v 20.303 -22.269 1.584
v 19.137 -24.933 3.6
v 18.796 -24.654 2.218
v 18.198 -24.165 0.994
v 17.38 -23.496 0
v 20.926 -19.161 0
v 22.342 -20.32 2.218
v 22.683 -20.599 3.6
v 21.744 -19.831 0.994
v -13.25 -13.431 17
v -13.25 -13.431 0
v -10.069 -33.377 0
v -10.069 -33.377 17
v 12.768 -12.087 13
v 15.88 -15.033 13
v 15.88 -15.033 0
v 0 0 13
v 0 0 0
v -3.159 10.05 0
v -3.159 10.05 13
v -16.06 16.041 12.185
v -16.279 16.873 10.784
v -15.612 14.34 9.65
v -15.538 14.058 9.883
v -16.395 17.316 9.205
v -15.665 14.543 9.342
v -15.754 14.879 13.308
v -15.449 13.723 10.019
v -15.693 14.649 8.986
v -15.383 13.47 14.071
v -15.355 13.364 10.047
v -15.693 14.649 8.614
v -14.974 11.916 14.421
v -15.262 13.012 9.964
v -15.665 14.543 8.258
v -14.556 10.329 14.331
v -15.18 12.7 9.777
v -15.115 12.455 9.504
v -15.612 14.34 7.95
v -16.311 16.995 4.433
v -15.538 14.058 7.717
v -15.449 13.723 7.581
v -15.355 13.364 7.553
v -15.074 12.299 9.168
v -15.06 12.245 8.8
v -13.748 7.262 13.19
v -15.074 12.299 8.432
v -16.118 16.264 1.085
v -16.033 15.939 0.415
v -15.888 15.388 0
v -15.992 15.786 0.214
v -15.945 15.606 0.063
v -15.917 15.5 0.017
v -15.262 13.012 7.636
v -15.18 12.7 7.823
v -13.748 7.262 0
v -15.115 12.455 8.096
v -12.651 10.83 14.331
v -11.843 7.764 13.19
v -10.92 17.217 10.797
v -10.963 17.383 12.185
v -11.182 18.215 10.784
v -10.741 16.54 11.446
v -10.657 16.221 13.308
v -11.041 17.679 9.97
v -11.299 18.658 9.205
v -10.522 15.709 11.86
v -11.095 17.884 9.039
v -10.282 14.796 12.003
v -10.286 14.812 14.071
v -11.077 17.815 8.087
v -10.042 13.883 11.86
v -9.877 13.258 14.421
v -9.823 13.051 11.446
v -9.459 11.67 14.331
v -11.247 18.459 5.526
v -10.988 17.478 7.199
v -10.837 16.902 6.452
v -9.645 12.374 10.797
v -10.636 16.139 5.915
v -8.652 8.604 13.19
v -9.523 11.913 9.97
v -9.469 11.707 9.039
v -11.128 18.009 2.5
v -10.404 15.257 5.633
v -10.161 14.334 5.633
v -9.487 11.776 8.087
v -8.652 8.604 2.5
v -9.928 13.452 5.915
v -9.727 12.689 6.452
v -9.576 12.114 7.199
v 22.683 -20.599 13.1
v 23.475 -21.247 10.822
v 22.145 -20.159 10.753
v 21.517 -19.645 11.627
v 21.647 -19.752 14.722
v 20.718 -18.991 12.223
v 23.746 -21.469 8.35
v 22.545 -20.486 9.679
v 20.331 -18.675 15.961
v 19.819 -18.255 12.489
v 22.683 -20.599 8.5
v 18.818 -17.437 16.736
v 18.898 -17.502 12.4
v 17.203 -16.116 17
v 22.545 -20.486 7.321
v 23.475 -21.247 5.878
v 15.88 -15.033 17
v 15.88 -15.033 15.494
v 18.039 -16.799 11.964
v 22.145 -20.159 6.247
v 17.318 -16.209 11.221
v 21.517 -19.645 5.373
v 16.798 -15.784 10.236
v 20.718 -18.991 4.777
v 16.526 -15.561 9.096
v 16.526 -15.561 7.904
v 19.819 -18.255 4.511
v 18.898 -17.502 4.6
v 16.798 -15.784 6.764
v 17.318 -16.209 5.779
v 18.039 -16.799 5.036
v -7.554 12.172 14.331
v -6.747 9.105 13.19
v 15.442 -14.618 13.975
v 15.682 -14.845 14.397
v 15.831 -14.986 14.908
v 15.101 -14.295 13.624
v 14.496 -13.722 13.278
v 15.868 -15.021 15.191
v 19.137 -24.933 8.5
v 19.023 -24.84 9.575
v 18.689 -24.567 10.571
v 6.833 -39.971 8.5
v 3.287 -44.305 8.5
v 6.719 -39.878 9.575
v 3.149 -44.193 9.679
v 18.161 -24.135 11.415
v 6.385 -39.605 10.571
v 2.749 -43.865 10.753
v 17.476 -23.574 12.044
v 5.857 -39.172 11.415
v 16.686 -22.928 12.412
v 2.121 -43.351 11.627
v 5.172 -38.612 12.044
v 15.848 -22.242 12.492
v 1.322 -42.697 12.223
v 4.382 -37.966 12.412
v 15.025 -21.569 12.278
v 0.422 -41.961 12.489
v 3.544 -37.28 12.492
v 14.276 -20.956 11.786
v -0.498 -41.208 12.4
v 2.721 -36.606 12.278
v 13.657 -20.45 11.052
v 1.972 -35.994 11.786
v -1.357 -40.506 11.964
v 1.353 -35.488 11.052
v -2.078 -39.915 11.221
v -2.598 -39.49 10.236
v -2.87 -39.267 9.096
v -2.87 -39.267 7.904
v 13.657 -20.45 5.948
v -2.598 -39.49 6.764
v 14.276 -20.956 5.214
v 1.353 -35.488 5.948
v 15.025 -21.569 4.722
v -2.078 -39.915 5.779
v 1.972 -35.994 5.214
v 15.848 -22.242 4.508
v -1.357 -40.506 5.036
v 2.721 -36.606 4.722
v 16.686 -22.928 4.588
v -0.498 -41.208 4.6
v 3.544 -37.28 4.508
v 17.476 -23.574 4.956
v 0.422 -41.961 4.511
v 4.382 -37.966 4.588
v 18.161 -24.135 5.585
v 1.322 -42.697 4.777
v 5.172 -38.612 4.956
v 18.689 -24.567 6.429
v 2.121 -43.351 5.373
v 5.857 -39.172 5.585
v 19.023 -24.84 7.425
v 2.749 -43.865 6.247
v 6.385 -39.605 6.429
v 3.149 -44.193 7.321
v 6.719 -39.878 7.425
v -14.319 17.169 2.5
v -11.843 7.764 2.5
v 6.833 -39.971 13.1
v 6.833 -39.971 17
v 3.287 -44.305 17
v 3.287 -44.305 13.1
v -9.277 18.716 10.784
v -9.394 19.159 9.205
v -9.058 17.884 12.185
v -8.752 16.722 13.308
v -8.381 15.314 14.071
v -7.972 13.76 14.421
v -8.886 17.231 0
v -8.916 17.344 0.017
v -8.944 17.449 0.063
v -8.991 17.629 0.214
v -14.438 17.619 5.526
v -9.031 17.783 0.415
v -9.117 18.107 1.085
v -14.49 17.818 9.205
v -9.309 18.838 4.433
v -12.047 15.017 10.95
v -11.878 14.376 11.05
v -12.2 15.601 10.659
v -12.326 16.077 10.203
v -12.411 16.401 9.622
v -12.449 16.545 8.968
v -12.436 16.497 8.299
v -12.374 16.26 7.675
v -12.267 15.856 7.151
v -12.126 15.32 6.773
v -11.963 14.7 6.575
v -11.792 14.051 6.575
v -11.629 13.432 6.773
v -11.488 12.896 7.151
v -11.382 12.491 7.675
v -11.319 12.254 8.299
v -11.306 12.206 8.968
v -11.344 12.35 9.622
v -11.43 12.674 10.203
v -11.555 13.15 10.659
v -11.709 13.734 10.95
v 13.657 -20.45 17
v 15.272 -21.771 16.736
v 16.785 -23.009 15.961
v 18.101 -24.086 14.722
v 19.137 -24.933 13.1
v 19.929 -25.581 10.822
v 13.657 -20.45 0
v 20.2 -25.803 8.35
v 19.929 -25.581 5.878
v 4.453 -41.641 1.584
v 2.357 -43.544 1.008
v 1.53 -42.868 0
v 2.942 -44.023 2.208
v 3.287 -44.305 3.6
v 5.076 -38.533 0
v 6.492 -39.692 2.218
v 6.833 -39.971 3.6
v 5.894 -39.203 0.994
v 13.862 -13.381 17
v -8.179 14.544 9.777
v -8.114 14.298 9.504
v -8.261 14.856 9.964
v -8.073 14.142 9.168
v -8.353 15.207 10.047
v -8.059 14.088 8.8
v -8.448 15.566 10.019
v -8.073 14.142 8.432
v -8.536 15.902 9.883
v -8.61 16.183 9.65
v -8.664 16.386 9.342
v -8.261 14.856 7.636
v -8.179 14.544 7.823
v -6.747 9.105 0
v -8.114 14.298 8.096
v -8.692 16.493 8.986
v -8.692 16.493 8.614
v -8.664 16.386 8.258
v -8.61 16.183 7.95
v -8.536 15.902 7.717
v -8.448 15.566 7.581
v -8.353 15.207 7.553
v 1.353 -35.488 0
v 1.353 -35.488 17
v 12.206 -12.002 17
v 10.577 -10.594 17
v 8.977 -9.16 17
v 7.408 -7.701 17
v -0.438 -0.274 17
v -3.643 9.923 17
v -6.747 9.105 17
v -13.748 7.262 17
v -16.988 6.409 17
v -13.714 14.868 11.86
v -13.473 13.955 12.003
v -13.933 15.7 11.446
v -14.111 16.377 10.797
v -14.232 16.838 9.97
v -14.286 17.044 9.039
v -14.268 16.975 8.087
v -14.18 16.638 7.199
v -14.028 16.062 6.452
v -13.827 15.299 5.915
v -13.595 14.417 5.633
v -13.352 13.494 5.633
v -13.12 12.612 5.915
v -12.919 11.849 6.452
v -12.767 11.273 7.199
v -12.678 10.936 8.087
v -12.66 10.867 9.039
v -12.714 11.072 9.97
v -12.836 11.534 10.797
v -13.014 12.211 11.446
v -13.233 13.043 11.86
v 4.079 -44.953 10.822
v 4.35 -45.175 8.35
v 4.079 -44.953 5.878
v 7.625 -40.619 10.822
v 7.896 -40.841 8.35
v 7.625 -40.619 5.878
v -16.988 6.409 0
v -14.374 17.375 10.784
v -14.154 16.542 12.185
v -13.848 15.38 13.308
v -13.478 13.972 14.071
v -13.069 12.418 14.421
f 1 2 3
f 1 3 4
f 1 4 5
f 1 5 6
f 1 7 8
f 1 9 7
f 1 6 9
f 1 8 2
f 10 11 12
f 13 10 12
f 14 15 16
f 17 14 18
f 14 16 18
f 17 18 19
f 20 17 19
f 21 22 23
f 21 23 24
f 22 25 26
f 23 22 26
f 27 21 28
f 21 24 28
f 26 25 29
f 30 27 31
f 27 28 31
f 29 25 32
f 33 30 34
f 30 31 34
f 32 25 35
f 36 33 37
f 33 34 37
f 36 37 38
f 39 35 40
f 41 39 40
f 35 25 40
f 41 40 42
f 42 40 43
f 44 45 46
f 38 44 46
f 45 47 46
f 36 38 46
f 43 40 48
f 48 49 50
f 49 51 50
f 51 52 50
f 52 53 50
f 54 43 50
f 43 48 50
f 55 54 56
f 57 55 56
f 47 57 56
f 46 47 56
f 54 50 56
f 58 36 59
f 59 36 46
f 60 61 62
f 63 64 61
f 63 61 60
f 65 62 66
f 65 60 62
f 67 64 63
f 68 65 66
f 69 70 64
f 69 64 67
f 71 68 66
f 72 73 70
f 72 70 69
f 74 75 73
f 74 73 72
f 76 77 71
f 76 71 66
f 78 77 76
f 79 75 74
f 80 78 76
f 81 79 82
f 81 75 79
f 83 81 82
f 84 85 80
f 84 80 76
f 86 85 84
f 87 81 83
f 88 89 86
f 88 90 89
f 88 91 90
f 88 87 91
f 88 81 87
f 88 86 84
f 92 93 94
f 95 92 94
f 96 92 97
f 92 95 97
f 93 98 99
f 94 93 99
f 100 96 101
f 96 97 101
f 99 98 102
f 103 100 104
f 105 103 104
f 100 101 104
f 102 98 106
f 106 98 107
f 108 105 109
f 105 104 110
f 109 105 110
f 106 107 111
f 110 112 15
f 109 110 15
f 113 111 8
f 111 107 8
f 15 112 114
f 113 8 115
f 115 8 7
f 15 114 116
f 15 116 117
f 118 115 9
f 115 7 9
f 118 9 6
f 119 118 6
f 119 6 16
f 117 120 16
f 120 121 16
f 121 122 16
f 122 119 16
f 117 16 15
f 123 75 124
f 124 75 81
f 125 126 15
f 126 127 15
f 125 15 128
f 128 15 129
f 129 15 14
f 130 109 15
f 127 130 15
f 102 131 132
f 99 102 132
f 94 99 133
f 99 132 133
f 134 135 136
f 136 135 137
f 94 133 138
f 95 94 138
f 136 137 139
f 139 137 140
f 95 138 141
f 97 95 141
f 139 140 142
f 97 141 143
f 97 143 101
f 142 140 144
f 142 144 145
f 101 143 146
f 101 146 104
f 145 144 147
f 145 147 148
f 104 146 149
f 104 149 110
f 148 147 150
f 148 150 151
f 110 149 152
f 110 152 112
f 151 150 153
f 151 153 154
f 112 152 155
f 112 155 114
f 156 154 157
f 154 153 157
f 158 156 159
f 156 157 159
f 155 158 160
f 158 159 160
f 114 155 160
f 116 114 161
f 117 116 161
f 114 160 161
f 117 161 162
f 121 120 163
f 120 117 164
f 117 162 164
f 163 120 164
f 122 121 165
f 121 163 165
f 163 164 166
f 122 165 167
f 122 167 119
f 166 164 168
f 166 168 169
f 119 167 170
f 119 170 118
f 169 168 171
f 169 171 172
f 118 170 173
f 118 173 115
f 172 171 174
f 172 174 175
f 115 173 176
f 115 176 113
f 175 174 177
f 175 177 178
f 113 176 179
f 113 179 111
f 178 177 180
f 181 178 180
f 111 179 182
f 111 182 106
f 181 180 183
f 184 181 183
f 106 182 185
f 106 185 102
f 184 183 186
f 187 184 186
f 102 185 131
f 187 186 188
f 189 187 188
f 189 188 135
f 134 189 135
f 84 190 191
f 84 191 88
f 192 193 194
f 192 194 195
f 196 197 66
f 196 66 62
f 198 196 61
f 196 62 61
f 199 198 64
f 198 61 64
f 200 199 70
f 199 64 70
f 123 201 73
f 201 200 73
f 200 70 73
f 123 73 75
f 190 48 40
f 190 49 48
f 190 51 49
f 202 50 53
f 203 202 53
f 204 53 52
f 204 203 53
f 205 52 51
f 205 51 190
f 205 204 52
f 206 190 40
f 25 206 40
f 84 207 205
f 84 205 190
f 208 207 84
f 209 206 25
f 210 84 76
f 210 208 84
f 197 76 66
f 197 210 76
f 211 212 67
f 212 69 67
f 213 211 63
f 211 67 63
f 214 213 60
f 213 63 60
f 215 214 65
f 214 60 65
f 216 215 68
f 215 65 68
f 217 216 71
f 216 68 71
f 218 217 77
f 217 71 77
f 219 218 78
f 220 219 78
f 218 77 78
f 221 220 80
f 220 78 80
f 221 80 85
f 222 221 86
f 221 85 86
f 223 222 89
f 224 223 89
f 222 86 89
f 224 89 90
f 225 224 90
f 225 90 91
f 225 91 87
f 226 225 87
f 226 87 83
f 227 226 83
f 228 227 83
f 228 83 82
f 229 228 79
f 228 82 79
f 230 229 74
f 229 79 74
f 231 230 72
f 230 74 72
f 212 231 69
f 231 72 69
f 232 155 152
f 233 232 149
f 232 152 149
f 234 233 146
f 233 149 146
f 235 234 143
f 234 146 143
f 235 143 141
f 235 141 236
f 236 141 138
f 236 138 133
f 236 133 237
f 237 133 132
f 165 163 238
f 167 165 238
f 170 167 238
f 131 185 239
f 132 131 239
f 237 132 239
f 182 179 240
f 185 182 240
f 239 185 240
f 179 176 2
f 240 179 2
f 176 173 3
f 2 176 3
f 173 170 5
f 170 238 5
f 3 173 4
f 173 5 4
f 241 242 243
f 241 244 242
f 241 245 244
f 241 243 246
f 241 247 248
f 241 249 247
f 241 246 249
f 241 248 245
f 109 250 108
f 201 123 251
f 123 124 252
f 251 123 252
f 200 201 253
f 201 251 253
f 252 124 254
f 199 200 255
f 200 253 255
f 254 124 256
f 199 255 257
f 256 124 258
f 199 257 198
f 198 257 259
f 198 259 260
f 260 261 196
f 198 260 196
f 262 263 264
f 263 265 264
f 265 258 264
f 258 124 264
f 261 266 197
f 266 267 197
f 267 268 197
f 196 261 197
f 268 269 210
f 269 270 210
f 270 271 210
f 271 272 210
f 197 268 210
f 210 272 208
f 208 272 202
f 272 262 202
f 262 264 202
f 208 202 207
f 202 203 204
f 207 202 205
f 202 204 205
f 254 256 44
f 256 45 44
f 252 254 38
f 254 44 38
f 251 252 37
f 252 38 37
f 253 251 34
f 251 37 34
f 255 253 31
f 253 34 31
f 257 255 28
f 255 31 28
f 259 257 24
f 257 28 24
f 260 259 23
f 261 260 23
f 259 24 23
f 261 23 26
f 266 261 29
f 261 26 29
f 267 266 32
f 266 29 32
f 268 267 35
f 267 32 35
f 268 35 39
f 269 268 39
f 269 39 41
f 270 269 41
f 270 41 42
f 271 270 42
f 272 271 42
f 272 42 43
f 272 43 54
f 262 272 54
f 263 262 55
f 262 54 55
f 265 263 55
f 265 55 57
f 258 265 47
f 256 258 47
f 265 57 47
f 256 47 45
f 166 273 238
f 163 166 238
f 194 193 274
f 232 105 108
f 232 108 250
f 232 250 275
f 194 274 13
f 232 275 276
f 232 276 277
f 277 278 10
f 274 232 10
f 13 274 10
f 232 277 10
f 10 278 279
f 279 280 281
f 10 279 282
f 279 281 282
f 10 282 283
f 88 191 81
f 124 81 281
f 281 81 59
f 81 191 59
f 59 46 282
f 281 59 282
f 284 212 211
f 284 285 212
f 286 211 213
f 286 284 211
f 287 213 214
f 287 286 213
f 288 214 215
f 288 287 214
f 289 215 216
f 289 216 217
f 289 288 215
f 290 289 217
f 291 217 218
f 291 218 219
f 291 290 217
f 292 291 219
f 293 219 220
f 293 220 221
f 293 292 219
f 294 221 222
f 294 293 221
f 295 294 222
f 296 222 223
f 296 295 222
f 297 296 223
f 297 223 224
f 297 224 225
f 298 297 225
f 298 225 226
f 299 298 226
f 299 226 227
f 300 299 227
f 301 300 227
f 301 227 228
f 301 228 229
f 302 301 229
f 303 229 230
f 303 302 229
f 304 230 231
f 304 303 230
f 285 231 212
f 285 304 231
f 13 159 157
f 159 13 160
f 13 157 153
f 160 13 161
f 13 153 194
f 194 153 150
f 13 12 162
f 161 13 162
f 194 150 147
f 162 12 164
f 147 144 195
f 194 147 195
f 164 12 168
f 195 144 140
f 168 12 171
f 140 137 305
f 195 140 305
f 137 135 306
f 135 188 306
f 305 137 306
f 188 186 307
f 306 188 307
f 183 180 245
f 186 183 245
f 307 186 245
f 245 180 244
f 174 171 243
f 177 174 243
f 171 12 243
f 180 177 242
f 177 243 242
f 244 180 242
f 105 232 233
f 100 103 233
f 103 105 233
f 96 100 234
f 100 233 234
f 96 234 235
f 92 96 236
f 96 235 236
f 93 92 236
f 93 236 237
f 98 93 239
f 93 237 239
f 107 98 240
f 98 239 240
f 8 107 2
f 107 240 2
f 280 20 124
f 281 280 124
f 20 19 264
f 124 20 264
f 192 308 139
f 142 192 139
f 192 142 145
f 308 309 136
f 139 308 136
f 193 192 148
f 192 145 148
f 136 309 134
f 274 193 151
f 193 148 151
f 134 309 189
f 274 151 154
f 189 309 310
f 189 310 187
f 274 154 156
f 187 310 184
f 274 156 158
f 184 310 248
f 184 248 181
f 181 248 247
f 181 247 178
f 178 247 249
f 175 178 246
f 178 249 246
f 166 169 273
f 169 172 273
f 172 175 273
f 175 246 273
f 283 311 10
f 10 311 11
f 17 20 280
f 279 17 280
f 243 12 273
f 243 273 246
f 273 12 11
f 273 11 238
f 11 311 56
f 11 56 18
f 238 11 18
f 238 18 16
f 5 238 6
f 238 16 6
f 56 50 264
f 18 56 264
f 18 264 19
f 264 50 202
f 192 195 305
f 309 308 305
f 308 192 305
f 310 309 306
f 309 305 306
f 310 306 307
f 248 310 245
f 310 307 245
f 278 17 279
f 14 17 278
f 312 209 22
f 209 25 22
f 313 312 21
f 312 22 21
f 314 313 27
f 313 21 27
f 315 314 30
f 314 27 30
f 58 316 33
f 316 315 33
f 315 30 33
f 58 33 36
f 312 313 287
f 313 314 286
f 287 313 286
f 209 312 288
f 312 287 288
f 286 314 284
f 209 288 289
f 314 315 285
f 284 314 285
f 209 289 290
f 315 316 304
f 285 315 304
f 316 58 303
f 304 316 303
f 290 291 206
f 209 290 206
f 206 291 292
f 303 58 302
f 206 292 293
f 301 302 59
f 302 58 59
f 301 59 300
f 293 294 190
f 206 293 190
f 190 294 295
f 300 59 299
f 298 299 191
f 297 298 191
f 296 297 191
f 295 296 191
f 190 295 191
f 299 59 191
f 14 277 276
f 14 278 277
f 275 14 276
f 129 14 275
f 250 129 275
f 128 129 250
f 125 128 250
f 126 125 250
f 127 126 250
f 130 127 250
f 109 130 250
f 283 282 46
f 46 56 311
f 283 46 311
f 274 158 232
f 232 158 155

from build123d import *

# Parameters (mm, degrees)
BOSS_EXTRUDE1_DEPTH           = 17
CUT_EXTRUDE1_DEPTH            = 17
SKETCH3_R                     = 1.25
CUT_EXTRUDE2_DEPTH            = 17
CUT_EXTRUDE3_START            = -10.402815
SKETCH4_W                     = 3.3
SKETCH4_H                     = 12.499682623
CUT_EXTRUDE3_DEPTH            = 10.402815
SKETCH5_R                     = 2.25
SKETCH5_R_2                   = 1.25
EXTRUDE_THIN1_DEPTH           = 1.65
EXTRUDE_THIN1_TAPER           = -30
EXTRUDE_THIN1_OTHER_WAY_DEPTH = 1.65
EXTRUDE_THIN1_OTHER_WAY_TAPER = -30
SKETCH6_R                     = 1.25
CUT_EXTRUDE4_DEPTH            = 58.713758796
CUT_EXTRUDE5_DEPTH            = 47
CUT_EXTRUDE6_DEPTH            = 51
SKETCH9_R                     = 4
CUT_EXTRUDE7_DEPTH            = 51
CHAMFER2_SIZE                 = 4
CHAMFER2_SIZE_2               = 0.5
FILLET3_R                     = 30
FILLET4_SIZE                  = 2
FILLET4_SIZE_2                = 10


with BuildPart() as part:
    # Sketch1 → Boss-Extrude1 (new body)
    with BuildSketch(Plane.XY):
        Polygon((0, 0), (-3.159113316, 10.05), (-6.746853749, 9.105426772), (-9.395430715, 19.165426772), (-16.396843313, 17.322108667), (-13.748266347, 7.262108667), (-16.987870242, 6.409192141), (-13.249821349, -13.430807859), (-10.069194805, -33.377281726), (4.664340434, -45.432247006), (8.210516928, -41.098122841), (1.353313338, -35.487565032), (13.657279278, -20.449702081), (20.514482868, -26.06025989), (24.060659362, -21.726135725), (15.88, -15.032727593), align=None)
    extrude(amount=BOSS_EXTRUDE1_DEPTH)

    # Sketch2 → Cut-Extrude1 (cut)
    with BuildSketch(Plane(origin=(-11.069057434, -2.914239618, 0), x_dir=(0, 0, 1), z_dir=(-0.9670459389139427, -0.2546019482055291, 0))):
        with BuildLine():
            Line((14.33099337, 13.694095472), (13.19, 10.523128091))
            Line((13.19, 10.523128091), (20.415721384, 10.523128091))
            Line((20.415721384, 10.523128091), (20.415721384, 21.928823046))
            Line((20.415721384, 21.928823046), (-2.093019815, 21.928823046))
            Line((-2.093019815, 21.928823046), (-2.093019815, 20.981086575))
            Line((-2.093019815, 20.981086575), (9.161350785, 20.925943092))
            ThreePointArc((9.161350785, 20.925943092), (13.295140538, 18.417290029), (14.33099337, 13.694095472))
        make_face()
    extrude(amount=-CUT_EXTRUDE1_DEPTH, mode=Mode.SUBTRACT)

    # Sketch3 → Cut-Extrude2 (cut)
    with BuildSketch(Plane(origin=(-11.069057434, -2.914239618, 0), x_dir=(0, 0, 1), z_dir=(-0.9670459389139427, -0.2546019482055291, 0))):
        with Locations(Location((8.8, 16.925943092, 0), (0, 0, 270))):
            Circle(SKETCH3_R)
    extrude(amount=-CUT_EXTRUDE2_DEPTH, mode=Mode.SUBTRACT)

    # Sketch4 → Cut-Extrude3 (cut)
    with BuildSketch(Plane(origin=(-5.327785879, 20.236348285, 0), x_dir=(0.9670459389139427, 0.2546019482055291, 0), z_dir=(-0.2546019482055291, 0.9670459389139427, 0)).offset(CUT_EXTRUDE3_START)):
        with Locations((-7.826258123, -8.749841312)):
            Rectangle(SKETCH4_W, SKETCH4_H)
    extrude(amount=CUT_EXTRUDE3_DEPTH, mode=Mode.SUBTRACT)

    # Sketch5 → Extrude-Thin1 (add)
    with BuildSketch(Plane(origin=(-7.568351135, -1.992580565, 0), x_dir=(0, 0, 1), z_dir=(-0.9670459389139427, -0.25460194820552917, 0))):
        with Locations((8.8, 16.925943092)):
            Circle(SKETCH5_R)
        with Locations((8.8, 16.925943092)):
            Circle(SKETCH5_R_2, mode=Mode.SUBTRACT)
    extrude(amount=EXTRUDE_THIN1_DEPTH, taper=EXTRUDE_THIN1_TAPER)

    # Sketch5 → Extrude-Thin1 other way (add)
    with BuildSketch(Plane(origin=(-7.568351135, -1.992580565, 0), x_dir=(0, 0, 1), z_dir=(-0.9670459389139427, -0.25460194820552917, 0))):
        with Locations((8.8, 16.925943092)):
            Circle(SKETCH5_R)
        with Locations((8.8, 16.925943092)):
            Circle(SKETCH5_R_2, mode=Mode.SUBTRACT)
    extrude(amount=-EXTRUDE_THIN1_OTHER_WAY_DEPTH, taper=EXTRUDE_THIN1_OTHER_WAY_TAPER)

    # Sketch6 → Cut-Extrude4 (cut, through all)
    with BuildSketch(Plane(origin=(-11.069057434, -2.914239618, 0), x_dir=(0, 0, 1), z_dir=(-0.9670459389139427, -0.2546019482055291, 0))):
        with Locations(Location((8.8, 16.925943092, 0), (0, 0, 270))):
            Circle(SKETCH6_R)
    extrude(amount=-CUT_EXTRUDE4_DEPTH, mode=Mode.SUBTRACT)

    # Sketch7 → Cut-Extrude5 (cut)
    with BuildSketch(Plane(origin=(-20.395990741, -24.927906579, 0), x_dir=(-0.773950743756153, 0.633245802385849, 0), z_dir=(-0.6332458023858489, -0.7739507437561529, 0))):
        with BuildLine():
            add(Edge.make_bspline(
                [(-28.329749458, 0), (-30.166192179, -1.367621789), (-30.599748983, -3.6)],
                knots=[0, 0, 0, 1, 1, 1], degree=2))
            Line((-28.329749458, 0), (-32.379749458, 0))
            Line((-32.379749458, 0), (-32.379749458, -17))
            Line((-32.379749458, -17), (-30.599749458, -17))
            Line((-30.599749458, -17), (-30.599749458, -13.1))
            ThreePointArc((-30.599749458, -13.1), (-31.973295872, -8.349999931), (-30.599748983, -3.6))
        make_face()
    extrude(amount=-CUT_EXTRUDE5_DEPTH, mode=Mode.SUBTRACT)

    # Sketch8 → Cut-Extrude6 (cut)
    with BuildSketch(Plane(origin=(-4.545848307, -5.555919463, 0), x_dir=(0.7739507437561534, -0.6332458023858486, 0), z_dir=(-0.6332458023858486, -0.7739507437561534, 0))):
        with BuildLine():
            Line((30.599749458, 13.1), (30.599749458, 17))
            Line((30.599749458, 17), (23.519749458, 17))
            ThreePointArc((23.519749458, 17), (27.561296191, 15.960500224), (30.599749458, 13.1))
        make_face()
    extrude(amount=-CUT_EXTRUDE6_DEPTH, mode=Mode.SUBTRACT)

    # Sketch9 → Cut-Extrude7 (cut)
    with BuildSketch(Plane(origin=(-20.395990741, -24.927906579, 0), x_dir=(-0.773950743756153, 0.633245802385849, 0), z_dir=(-0.6332458023858489, -0.7739507437561529, 0))):
        with Locations(Location((-26.599749458, -8.5, 0), (0, 0, 180))):
            Circle(SKETCH9_R)
    extrude(amount=-CUT_EXTRUDE7_DEPTH, mode=Mode.SUBTRACT)

    # Chamfer2
    # the kernel refuses this chamfer: 4, 0.5 mm, written as the material it takes off along each edge
    with BuildSketch(Plane(origin=(23.430476857, -22.180351132, 17), x_dir=(0.003280548241470475, 0.003465446024389789, -0.9999886142787264), z_dir=(-0.7262148132107521, 0.6874678502106645, 0))) as chamfer2_piece_1_section:
        Polygon((CHAMFER2_SIZE * 0.999988614279, CHAMFER2_SIZE * 0.00477192968437), (-CHAMFER2_SIZE_2 * 0.00477192968437, CHAMFER2_SIZE_2 * 0.999988614279), (0, 0), align=None)
    chamfer2_piece_1 = extrude(amount=42.660867212, mode=Mode.PRIVATE)
    chamfer2_piece_1 = split(chamfer2_piece_1, bisect_by=Plane(origin=(2.714923218, -8.636910301, 15.455863369), z_dir=(0.9539790028805075, 0.2998734100635013, 0)), keep=Keep.TOP, mode=Mode.PRIVATE)
    chamfer2_piece_1 = split(chamfer2_piece_1, bisect_by=Plane(origin=(6.949444097, -7.725754787, 15.455863369), z_dir=(0.6332458023858455, 0.7739507437561558, 0)), keep=Keep.TOP, mode=Mode.PRIVATE)
    add(chamfer2_piece_1, mode=Mode.SUBTRACT)
    with BuildSketch(Plane(origin=(3.117792699, -9.918547862, 17), x_dir=(0.0045523207221114005, 0.0014309748270353465, -0.9999886142787264), z_dir=(-0.2998734100635013, 0.9539790028805075, 0))) as chamfer2_piece_2_section:
        Polygon((CHAMFER2_SIZE * 0.999988614279, CHAMFER2_SIZE * 0.00477192968437), (-CHAMFER2_SIZE_2 * 0.00477192968437, CHAMFER2_SIZE_2 * 0.999988614279), (0, 0), align=None)
    chamfer2_piece_2 = extrude(amount=31.328882119, mode=Mode.PRIVATE)
    chamfer2_piece_2 = split(chamfer2_piece_2, bisect_by=Plane(origin=(-6.749370263, 6.389259735, 15.513791759), z_dir=(0.6874678502106645, 0.7262148132107521, 0)), keep=Keep.TOP, mode=Mode.PRIVATE)
    add(chamfer2_piece_2, mode=Mode.SUBTRACT)
    with BuildSketch(Plane(origin=(3.117792699, -9.918547862, 17), x_dir=(0.0045523207221114005, 0.0014309748270353465, -0.9999886142787264), z_dir=(-0.2998734100635013, 0.9539790028805075, 0))) as chamfer2_piece_3a_section:
        Polygon((CHAMFER2_SIZE * 0.999988614279, CHAMFER2_SIZE * 0.00477192968437), (-CHAMFER2_SIZE_2 * 0.00477192968437, CHAMFER2_SIZE_2 * 0.999988614279), (0, 0), align=None)
    chamfer2_piece_3a = extrude(amount=31.328882119, mode=Mode.PRIVATE)
    chamfer2_piece_3a = split(chamfer2_piece_3a, bisect_by=Plane(origin=(3.183687603, -3.013822952, 15.535130807), z_dir=(-0.6874678502106645, -0.7262148132107521, 0)), keep=Keep.TOP, mode=Mode.PRIVATE)
    with BuildSketch(Plane(origin=(23.430476857, -22.180351132, 17), x_dir=(0.003280548241470475, 0.003465446024389789, -0.9999886142787264), z_dir=(-0.7262148132107521, 0.6874678502106645, 0))) as chamfer2_piece_3b_section:
        Polygon((CHAMFER2_SIZE * 0.999988614279, CHAMFER2_SIZE * 0.00477192968437), (-CHAMFER2_SIZE_2 * 0.00477192968437, CHAMFER2_SIZE_2 * 0.999988614279), (0, 0), align=None)
    chamfer2_piece_3b = extrude(amount=42.660867212, mode=Mode.PRIVATE)
    chamfer2_piece_3b = split(chamfer2_piece_3b, bisect_by=Plane(origin=(-1.314629282, 4.18219385, 15.535130807), z_dir=(-0.9539790028805075, -0.2998734100635013, 0)), keep=Keep.TOP, mode=Mode.PRIVATE)
    chamfer2_piece_3 = chamfer2_piece_3a & chamfer2_piece_3b
    add(chamfer2_piece_3, mode=Mode.SUBTRACT)

    # Fillet3
    # the kernel refuses this fillet: 30 mm, written as the material it adds along each edge
    with BuildSketch(Plane(origin=(19.498535053, -17.993409719, 10.299717624), x_dir=(0.3870758506648627, -0.3167051128458923, 0.865950435838763), z_dir=(-0.6702029838732583, 0.5483594785692364, 0.500129825815914))) as fillet3_piece_1_section:
        with BuildLine():
            CenterArc((FILLET3_R * 0.071988838012, FILLET3_R), FILLET3_R, 261.764893066, 8.235106934)
            Line((-FILLET3_R * 0.071246536041, FILLET3_R * 0.0103113481403), (0, 0))
            Line((0, 0), (FILLET3_R * 0.071988838012, 0))
        make_face()
    fillet3_piece_1 = extrude(amount=18.796249028, mode=Mode.PRIVATE)
    fillet3_piece_1 = split(fillet3_piece_1, bisect_by=Plane(origin=(13.825719707, -13.08805278, 14.411900392), z_dir=(-0.6874678502106645, -0.7262148132107521, 0)), keep=Keep.TOP, mode=Mode.PRIVATE)
    fillet3_piece_1 = split(fillet3_piece_1, bisect_by=Plane(origin=(13.532386136, -13.397919176, 17), z_dir=(0, 0, -1)), keep=Keep.TOP, mode=Mode.PRIVATE)
    fillet3_piece_1 = fillet3_piece_1 - Plane(origin=(19.447051663, -18.23729319, 8.5), x_dir=(0.773950743756153, -0.633245802385849, 0), z_dir=(-0.633245802385849, -0.773950743756153, 0)) * Cylinder(4, 47, mode=Mode.PRIVATE)
    add(fillet3_piece_1)

    # Fillet4
    # an asymmetric fillet: 10, 2 mm, written as the material it takes off along each edge
    with BuildSketch(Plane(origin=(14.780717757, 25.530475477, 0), x_dir=(0.2546019482055286, -0.9670459389139429, 0), z_dir=(-0.9670459389139429, -0.2546019482055286, 0))) as fillet4_piece_1:
        with BuildLine():
            Bezier((FILLET4_SIZE, 0), (0, 0), (0, FILLET4_SIZE_2), weights=[1, 0.707106781, 1])
            Line((0, FILLET4_SIZE_2), (0, 0))
            Line((0, 0), (FILLET4_SIZE, 0))
        make_face()
    extrude(amount=57.24, mode=Mode.SUBTRACT)


solid = part.part
